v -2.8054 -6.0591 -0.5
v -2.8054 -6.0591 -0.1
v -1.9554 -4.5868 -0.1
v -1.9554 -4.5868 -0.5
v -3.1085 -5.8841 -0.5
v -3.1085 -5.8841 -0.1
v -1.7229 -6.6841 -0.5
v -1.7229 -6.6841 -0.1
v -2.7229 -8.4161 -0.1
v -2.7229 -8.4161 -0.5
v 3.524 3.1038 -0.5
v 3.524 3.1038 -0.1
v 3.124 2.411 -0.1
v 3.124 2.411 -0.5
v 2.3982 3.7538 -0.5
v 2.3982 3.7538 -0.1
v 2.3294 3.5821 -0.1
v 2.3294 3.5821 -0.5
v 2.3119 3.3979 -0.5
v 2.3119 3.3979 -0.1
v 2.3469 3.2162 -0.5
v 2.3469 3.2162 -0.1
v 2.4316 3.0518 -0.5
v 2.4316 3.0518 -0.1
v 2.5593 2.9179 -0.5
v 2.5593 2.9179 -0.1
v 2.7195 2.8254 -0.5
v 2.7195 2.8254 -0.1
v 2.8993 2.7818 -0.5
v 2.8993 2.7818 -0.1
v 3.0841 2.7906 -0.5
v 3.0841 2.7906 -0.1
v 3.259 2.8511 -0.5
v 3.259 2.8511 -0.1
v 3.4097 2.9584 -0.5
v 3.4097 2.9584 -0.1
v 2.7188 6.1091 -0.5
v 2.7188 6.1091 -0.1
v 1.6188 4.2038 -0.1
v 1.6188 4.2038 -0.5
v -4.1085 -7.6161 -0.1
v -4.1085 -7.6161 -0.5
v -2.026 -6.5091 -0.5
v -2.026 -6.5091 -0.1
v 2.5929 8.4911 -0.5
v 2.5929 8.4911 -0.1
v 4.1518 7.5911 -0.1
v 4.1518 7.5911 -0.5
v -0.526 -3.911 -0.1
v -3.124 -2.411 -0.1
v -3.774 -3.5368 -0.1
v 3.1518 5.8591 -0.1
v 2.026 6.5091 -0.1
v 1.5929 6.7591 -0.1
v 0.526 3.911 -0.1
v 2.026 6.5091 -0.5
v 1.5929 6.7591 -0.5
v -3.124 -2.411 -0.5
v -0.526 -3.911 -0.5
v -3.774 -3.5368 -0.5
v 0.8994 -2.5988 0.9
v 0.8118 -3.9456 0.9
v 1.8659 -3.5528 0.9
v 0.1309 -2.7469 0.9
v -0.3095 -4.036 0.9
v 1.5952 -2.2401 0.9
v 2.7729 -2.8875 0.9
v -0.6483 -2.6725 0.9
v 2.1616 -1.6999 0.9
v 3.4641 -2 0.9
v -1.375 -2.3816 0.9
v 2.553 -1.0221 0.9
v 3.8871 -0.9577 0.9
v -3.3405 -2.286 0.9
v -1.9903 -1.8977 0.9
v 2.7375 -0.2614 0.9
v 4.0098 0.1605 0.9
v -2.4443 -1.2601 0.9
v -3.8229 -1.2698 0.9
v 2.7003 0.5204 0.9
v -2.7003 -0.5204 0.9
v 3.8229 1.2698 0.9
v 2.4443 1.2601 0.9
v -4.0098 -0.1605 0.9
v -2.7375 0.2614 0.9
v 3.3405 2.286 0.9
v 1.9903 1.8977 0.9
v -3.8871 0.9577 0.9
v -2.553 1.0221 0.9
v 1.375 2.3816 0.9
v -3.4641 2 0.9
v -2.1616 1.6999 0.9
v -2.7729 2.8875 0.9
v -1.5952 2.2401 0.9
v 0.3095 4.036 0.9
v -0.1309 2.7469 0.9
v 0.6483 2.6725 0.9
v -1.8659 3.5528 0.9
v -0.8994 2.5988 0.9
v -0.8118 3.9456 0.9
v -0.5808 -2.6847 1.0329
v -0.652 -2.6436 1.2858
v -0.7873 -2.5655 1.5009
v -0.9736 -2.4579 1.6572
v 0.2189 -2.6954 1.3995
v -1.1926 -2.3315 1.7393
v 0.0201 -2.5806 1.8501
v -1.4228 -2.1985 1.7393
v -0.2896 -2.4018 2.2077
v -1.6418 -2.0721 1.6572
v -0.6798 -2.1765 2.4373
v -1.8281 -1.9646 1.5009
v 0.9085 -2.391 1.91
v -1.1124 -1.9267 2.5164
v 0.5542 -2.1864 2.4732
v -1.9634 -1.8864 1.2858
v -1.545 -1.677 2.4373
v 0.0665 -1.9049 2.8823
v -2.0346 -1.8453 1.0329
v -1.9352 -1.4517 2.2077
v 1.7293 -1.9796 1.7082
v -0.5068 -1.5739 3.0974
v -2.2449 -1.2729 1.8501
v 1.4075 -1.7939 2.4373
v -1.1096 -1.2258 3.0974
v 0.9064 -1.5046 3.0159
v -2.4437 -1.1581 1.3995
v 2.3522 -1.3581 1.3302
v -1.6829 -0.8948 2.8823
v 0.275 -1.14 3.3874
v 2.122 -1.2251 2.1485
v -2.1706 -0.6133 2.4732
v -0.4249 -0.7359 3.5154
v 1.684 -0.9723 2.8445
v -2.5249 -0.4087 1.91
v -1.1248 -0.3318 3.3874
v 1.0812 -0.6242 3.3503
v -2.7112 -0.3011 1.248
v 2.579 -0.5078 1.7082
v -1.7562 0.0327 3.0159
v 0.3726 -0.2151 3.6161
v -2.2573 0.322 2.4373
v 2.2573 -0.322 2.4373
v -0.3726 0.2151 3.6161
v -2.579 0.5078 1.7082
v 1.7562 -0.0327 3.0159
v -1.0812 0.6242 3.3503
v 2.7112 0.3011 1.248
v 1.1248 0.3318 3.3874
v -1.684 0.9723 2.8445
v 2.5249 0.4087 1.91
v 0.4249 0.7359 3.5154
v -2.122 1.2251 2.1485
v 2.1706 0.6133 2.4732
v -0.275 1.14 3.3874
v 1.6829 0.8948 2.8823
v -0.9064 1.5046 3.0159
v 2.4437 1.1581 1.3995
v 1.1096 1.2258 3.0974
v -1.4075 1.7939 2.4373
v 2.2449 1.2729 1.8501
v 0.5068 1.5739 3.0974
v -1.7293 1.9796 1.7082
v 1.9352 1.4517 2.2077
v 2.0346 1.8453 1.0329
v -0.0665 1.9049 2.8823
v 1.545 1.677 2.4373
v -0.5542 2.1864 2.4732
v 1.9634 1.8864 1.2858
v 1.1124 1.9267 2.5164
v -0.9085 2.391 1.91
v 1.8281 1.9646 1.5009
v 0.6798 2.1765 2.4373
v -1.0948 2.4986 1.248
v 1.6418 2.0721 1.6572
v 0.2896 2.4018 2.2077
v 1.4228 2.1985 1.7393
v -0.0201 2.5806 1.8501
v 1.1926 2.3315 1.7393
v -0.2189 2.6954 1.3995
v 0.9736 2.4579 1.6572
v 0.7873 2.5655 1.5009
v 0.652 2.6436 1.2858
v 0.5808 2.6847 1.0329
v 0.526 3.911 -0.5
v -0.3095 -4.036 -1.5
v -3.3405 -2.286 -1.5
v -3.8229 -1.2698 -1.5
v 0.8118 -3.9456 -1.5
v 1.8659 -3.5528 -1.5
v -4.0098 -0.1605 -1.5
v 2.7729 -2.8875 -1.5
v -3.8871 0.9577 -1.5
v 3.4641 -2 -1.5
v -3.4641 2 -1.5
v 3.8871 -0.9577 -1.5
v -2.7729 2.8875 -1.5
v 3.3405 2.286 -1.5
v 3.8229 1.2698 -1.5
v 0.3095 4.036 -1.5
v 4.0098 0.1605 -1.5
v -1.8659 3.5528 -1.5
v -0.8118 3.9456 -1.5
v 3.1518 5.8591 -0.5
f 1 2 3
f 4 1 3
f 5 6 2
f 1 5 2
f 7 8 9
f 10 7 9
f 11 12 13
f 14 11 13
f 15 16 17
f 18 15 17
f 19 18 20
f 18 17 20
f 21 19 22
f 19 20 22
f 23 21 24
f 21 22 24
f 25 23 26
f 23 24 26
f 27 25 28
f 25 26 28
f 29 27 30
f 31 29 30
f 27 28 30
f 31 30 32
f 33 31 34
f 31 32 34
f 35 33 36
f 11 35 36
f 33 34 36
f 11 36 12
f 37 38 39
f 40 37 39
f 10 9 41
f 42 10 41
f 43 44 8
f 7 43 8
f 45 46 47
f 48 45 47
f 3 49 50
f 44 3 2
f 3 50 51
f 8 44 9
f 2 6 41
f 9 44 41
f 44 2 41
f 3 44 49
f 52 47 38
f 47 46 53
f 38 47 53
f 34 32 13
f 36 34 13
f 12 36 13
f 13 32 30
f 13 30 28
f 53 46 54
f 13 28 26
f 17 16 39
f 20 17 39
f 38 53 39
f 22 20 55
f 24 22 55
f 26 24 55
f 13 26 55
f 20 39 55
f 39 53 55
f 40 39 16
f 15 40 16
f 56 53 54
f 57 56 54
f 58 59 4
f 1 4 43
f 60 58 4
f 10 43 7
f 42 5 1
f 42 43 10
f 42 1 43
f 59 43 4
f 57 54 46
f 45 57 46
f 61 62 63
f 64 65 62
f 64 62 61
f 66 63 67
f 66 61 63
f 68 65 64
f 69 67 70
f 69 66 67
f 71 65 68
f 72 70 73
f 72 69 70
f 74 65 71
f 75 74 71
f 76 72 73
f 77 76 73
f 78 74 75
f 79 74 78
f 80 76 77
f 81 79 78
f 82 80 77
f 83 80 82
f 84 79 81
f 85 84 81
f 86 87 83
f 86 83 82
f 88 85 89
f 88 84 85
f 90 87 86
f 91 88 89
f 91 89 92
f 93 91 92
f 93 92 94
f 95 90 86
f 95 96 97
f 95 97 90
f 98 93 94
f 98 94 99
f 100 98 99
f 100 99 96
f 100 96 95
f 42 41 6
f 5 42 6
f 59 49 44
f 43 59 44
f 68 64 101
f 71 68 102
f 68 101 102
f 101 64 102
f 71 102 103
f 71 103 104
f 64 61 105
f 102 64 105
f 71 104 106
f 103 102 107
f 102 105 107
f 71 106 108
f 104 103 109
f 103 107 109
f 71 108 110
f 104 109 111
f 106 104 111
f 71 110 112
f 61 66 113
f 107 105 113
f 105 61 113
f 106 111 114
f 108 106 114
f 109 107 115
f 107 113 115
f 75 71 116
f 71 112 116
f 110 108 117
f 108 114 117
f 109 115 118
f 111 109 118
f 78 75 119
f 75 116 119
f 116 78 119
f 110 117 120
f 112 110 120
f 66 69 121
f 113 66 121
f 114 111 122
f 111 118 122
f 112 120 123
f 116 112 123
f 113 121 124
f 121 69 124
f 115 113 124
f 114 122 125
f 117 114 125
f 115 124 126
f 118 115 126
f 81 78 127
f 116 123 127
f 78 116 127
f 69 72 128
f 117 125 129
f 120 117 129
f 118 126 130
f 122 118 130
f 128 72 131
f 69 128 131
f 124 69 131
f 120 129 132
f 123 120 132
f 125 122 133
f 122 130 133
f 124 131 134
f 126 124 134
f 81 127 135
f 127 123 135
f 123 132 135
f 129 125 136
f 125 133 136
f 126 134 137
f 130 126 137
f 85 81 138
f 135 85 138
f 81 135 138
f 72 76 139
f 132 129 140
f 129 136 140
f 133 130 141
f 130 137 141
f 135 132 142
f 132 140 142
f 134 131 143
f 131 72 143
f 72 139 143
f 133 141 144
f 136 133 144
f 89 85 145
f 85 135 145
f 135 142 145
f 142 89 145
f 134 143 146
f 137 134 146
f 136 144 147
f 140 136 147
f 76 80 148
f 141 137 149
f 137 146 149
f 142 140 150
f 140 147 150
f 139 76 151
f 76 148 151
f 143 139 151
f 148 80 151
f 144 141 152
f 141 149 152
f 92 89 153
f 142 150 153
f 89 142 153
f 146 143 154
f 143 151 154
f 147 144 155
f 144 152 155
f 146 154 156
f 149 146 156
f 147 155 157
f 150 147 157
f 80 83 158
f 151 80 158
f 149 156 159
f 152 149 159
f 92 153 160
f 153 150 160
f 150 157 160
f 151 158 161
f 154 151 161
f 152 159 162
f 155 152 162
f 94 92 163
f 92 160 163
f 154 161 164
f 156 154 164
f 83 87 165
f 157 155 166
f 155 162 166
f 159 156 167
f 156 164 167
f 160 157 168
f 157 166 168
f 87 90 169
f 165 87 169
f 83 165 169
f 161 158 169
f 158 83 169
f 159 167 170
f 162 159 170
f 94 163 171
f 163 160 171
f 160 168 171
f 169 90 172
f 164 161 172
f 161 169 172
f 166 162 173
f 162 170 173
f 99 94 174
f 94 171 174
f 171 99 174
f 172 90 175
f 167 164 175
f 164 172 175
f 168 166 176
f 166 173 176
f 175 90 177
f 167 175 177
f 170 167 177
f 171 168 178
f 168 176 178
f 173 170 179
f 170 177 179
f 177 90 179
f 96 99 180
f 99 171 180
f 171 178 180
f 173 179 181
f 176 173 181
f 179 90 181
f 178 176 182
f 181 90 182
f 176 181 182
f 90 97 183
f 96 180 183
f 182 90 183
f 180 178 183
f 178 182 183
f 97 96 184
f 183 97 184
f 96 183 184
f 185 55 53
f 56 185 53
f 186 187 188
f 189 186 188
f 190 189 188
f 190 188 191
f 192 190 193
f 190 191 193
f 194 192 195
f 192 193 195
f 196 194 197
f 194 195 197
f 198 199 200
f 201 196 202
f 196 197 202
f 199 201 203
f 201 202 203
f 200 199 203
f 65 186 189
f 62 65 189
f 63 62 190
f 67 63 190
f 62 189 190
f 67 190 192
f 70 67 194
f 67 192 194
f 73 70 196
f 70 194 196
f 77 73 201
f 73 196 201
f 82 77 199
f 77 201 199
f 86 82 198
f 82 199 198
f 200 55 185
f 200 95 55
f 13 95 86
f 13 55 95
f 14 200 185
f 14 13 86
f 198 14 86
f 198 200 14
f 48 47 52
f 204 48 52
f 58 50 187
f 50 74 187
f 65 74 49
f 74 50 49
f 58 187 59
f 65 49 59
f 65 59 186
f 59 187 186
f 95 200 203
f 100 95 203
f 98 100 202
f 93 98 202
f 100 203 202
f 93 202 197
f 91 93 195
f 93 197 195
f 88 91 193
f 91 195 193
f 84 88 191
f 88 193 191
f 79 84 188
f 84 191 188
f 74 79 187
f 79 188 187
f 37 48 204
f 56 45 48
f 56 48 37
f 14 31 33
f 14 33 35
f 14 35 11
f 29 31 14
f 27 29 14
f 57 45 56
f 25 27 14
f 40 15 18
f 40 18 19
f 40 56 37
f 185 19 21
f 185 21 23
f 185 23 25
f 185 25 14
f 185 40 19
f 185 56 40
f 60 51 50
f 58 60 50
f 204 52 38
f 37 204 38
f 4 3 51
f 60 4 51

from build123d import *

# Parameters (mm, degrees)
REVOLUTION006_ANGLE       = -180
PAD029_DEPTH              = 0.4
BODY028_PLACEMENT_ANGLE   = 180
PAD028_DEPTH              = 2.4
FUSION007_PLACEMENT_ANGLE = 60


with BuildPart() as light006:
    # Sketch044 (on Face1 of ShapeBinder013) → Revolution006 (revolve)
    with BuildSketch(Plane.XY.offset(2.4)):
        with BuildLine():
            ThreePointArc((-2.75, 0), (0, -2.75), (2.75, 0))
            Line((-2.75, 0), (2.75, 0))
        make_face()
    revolve(axis=Axis((-2.75, 0, 2.4), (1, 0, 0)), revolution_arc=REVOLUTION006_ANGLE)


with BuildPart() as body028:
    # Sketch045 (on Face1 of ShapeBinder014) → Pad029 (new body)
    with BuildSketch(Plane(origin=(0, 0, 0), x_dir=(1, 0, 0), z_dir=(0, 0, -1))):
        with BuildLine():
            Line((3.65, 1.5), (6.65, 1.5))
            Line((6.65, 1.5), (6.65, 2))
            Line((6.65, 2), (8.65, 2))
            Line((8.65, 2), (8.65, 0.2))
            Line((8.65, 0.2), (6.65, 0.2))
            Line((6.65, 0.2), (6.65, 0.7))
            Line((6.65, 0.7), (4.45, 0.7))
            Line((4.45, 0.7), (4.45, -0.2))
            ThreePointArc((4.45, -0.2), (3.8, -0.85), (4.45, -1.5))
            Line((4.45, -1.5), (-6.65, -1.5))
            Line((-6.65, -1.5), (-6.65, -1.85))
            Line((-6.65, -1.85), (-8.65, -1.85))
            Line((-8.65, -1.85), (-8.65, -0.25))
            Line((-8.65, -0.25), (-6.65, -0.25))
            Line((-6.65, -0.25), (-6.65, -0.6))
            Line((-6.65, -0.6), (-4.95, -0.6))
            Line((-4.95, -0.6), (-4.95, 1.5))
            Line((-4.95, 1.5), (3.65, 1.5))
        make_face()
    extrude(amount=-PAD029_DEPTH)


with BuildPart() as body028_1:
    # Body028 placement: moved
    add(body028.part.moved(Location((0, 0, 1.4))).rotate(Axis((0, 0, 1.4), (1, 0, 0)), BODY028_PLACEMENT_ANGLE))


with BuildPart() as led1:
    # Sketch043 → Pad028 (new body)
    with BuildSketch(Plane.XY):
        with BuildLine():
            Line((-3.65, 1.75), (-3.65, -1.75))
            ThreePointArc((-3.65, -1.75), (0, -4), (3.65, -1.75))
            Line((3.65, 1.75), (3.65, -1.75))
            ThreePointArc((3.65, 1.75), (0, 4), (-3.65, 1.75))
        make_face()
    extrude(amount=PAD028_DEPTH)

    # Fusion007: union light006, Body028
    add(light006.part)
    add(body028_1.part)


with BuildPart() as led1_1:
    # Fusion007 placement: moved
    add(led1.part.moved(Location((0, 0, -1.5))).rotate(Axis((0, 0, -1.5), (0, 0, 1)), FUSION007_PLACEMENT_ANGLE))


solid = led1_1.part
